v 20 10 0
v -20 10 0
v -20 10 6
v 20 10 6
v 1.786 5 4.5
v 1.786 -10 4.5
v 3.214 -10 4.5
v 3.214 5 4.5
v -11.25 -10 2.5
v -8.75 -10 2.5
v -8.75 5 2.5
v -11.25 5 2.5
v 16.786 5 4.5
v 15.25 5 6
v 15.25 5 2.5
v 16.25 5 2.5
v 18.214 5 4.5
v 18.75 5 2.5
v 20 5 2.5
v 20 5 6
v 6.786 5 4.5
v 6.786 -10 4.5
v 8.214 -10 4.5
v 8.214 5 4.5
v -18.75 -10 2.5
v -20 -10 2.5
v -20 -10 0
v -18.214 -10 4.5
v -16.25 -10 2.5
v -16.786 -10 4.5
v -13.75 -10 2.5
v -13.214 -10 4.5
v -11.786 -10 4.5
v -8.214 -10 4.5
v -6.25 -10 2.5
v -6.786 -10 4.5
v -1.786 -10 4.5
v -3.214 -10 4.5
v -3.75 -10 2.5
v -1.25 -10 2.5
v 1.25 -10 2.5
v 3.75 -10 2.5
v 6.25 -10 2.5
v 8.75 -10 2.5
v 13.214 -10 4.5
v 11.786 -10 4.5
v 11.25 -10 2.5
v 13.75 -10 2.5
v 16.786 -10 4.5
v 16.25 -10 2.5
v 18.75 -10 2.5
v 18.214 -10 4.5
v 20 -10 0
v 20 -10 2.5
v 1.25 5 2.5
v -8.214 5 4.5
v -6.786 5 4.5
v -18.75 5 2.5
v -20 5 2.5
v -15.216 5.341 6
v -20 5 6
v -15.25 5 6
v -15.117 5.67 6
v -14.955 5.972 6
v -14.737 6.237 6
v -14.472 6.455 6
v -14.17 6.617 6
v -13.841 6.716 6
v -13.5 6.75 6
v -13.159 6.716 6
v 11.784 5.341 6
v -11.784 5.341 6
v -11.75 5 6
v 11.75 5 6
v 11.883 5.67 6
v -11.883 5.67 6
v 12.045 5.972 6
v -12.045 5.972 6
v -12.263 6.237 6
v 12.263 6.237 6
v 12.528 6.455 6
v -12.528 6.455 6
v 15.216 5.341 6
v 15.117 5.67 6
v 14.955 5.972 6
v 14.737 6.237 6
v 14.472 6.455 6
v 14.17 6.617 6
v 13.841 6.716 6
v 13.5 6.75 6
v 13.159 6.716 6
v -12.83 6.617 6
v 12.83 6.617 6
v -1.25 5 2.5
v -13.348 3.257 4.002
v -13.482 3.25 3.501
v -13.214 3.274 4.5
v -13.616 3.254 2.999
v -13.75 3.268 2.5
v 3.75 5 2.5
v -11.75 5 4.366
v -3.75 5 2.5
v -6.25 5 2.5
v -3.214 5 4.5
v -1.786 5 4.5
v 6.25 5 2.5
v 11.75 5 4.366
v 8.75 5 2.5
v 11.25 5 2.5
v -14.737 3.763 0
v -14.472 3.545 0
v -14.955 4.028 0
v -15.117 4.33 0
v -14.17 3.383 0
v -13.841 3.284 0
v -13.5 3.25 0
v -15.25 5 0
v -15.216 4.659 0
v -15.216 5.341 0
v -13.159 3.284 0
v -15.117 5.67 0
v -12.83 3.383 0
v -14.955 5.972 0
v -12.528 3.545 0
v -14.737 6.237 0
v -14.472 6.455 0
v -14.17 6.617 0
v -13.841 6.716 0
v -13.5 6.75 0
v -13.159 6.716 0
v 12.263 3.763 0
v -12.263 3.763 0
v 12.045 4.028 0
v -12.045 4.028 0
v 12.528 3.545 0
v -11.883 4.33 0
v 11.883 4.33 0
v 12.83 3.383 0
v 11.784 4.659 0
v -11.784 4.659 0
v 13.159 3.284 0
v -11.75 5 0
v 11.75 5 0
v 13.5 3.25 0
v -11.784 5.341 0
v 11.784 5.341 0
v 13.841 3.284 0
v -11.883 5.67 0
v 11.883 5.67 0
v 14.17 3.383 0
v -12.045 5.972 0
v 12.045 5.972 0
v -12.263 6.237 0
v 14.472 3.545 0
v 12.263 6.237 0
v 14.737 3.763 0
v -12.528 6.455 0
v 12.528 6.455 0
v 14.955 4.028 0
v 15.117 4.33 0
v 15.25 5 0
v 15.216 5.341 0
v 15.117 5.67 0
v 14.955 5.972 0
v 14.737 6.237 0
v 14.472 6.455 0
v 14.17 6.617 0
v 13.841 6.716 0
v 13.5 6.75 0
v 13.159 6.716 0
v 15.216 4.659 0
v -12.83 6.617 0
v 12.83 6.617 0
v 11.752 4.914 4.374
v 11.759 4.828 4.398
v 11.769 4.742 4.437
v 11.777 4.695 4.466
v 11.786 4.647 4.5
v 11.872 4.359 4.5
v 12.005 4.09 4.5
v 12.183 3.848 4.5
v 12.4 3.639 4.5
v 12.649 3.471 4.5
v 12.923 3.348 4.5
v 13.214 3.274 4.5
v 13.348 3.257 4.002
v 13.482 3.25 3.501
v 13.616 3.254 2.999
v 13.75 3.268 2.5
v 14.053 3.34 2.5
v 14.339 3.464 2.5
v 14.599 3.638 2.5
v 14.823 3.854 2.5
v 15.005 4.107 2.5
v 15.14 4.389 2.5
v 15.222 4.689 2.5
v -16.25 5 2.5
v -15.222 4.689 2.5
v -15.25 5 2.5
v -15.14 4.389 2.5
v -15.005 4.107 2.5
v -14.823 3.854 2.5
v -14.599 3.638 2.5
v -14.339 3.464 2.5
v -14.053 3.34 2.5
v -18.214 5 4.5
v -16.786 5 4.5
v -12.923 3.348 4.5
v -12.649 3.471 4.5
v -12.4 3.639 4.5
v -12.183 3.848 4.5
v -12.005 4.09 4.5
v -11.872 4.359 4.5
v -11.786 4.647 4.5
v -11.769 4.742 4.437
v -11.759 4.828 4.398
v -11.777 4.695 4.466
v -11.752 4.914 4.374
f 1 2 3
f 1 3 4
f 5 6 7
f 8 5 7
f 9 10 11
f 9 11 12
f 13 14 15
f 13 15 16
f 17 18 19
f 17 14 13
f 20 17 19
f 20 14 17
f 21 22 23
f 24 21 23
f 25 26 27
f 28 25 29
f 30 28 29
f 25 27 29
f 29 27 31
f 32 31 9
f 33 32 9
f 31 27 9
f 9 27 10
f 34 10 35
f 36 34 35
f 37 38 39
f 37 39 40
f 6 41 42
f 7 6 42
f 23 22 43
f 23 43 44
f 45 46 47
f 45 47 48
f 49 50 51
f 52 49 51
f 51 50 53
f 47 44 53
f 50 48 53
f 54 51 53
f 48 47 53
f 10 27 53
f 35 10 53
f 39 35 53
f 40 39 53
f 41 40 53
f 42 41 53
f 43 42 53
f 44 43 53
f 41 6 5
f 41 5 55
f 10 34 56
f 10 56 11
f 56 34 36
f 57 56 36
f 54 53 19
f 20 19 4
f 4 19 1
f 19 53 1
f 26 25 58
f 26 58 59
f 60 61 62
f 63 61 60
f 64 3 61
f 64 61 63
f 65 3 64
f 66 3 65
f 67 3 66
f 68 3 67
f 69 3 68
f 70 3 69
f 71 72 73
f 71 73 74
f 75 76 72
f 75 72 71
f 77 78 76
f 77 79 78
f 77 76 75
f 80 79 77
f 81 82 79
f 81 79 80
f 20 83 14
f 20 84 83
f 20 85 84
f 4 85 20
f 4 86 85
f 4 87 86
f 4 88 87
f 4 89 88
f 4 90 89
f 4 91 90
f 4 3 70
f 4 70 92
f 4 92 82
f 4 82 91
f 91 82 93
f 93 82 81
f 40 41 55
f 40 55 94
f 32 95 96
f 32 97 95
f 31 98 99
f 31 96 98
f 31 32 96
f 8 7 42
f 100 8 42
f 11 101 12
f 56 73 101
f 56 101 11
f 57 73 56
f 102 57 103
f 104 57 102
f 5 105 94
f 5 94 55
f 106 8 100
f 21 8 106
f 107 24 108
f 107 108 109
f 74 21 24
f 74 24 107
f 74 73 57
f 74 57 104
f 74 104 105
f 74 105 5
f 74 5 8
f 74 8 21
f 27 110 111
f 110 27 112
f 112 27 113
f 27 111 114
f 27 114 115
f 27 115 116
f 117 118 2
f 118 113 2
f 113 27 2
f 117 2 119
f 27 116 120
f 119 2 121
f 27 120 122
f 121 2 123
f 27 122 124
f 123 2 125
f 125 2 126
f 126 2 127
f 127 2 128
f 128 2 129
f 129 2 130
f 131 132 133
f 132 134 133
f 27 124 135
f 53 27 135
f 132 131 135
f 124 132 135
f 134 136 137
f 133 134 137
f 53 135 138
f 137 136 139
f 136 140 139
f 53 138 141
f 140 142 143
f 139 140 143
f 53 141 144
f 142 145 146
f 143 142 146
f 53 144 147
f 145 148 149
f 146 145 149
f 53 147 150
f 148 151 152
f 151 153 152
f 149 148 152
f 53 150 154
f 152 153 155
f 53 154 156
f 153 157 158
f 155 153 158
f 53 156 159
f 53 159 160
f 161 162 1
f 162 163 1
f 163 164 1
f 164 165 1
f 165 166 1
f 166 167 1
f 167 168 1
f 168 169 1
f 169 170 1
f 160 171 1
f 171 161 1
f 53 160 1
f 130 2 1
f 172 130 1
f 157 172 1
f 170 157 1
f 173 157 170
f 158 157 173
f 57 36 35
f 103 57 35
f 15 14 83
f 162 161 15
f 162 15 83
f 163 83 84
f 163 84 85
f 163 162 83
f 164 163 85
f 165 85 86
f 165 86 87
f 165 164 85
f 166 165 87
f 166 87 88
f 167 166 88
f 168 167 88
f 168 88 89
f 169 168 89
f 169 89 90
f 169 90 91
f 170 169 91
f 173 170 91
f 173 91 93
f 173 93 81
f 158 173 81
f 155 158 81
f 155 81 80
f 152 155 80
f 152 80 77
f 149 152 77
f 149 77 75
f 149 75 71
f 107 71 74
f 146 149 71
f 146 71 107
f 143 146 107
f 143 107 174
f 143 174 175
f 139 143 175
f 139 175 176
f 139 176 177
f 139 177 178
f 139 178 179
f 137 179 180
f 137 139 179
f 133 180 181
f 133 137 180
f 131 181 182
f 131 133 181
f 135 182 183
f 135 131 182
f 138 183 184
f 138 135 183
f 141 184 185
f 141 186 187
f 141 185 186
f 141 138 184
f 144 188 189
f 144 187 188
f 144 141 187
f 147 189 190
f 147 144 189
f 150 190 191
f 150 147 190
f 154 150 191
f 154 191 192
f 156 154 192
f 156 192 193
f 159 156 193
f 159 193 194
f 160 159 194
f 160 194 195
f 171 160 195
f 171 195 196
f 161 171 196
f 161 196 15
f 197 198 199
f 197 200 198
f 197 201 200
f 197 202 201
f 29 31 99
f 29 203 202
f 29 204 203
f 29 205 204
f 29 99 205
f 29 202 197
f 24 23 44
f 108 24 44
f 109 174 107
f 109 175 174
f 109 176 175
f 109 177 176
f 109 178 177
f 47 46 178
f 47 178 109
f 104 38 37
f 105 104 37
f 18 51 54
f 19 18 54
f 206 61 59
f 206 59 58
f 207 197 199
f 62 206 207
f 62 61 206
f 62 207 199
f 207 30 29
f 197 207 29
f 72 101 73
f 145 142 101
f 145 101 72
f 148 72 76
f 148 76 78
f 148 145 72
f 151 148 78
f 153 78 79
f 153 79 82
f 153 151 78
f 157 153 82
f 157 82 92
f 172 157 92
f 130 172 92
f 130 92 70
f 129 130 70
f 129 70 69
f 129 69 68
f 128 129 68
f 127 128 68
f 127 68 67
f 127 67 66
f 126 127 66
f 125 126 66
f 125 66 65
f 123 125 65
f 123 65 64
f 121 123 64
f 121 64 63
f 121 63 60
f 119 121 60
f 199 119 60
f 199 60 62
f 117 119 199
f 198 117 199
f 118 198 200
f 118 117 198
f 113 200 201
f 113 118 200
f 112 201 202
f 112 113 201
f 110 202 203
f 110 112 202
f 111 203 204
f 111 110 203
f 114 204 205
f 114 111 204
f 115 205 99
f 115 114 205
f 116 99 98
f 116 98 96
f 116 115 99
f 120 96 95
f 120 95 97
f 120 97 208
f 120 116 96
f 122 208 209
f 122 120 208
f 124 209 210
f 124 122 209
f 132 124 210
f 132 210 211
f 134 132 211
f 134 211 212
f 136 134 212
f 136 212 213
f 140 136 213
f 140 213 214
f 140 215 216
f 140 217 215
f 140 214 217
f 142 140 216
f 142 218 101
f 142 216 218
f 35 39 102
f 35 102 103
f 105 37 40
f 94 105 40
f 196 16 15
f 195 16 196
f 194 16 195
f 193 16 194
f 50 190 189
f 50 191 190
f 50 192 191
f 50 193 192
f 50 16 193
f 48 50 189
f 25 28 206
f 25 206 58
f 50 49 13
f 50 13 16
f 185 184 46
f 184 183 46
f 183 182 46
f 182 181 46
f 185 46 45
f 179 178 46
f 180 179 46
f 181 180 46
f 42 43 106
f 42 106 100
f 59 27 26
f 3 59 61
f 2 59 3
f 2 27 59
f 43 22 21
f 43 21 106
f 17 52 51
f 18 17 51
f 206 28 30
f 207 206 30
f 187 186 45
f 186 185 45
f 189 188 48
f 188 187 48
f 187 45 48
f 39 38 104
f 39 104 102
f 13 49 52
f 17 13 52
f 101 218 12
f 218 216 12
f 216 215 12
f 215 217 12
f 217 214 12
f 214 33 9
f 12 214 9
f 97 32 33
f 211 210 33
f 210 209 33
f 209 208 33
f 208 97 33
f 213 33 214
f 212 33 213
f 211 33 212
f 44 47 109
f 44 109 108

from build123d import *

# Parameters (mm, degrees)
SKETCH_1_W             = 40
SKETCH_1_H             = 20
SKETCH_1_R             = 1.75
EXTRUDE_1_DEPTH        = 6
SKETCH_2_W             = 40
SKETCH_2_H             = 1.5
CUT_EXTRUDE_1_DEPTH    = 15
CUT_EXTRUDE_2_DEPTH    = 15
PATTERN_LINEAR_1_COUNT = 8
PATTERN_LINEAR_1_PITCH = 5


with BuildPart() as part:
    # 草圖1 → 填料-伸長1 (new body)
    with BuildSketch(Plane.XY):
        Rectangle(SKETCH_1_W, SKETCH_1_H)
        with Locations((-13.5, 5)):
            Circle(SKETCH_1_R, mode=Mode.SUBTRACT)
        with Locations((13.5, 5)):
            Circle(SKETCH_1_R, mode=Mode.SUBTRACT)
    extrude(amount=EXTRUDE_1_DEPTH)

    # 草圖2 → 除料-伸長1 (cut)
    with BuildSketch(Plane.XZ.offset(10)):
        with Locations((0, 5.25)):
            Rectangle(SKETCH_2_W, SKETCH_2_H)
    extrude(amount=-CUT_EXTRUDE_1_DEPTH, mode=Mode.SUBTRACT)

    # 草圖3 → 除料-伸長2 (cut)
    with BuildSketch(Plane(origin=(0, -10, 0), x_dir=(-1, 0, 0), z_dir=(0, -1, 0))):
        Polygon((20, -4.5), (18.214101615, -4.5), (18.75, -2.5), (20, -2.5), align=None)
        Polygon((16.785898385, -4.5), (16.25, -2.5), (15, -2.5), (15, -4.5), align=None)
    cut_extrude_2 = extrude(amount=-CUT_EXTRUDE_2_DEPTH, mode=Mode.SUBTRACT)

    # 直線複製排列1: 除料-伸長2 ×8
    with Locations(*[(i * PATTERN_LINEAR_1_PITCH, 0, 0) for i in range(1, PATTERN_LINEAR_1_COUNT)]):
        add(cut_extrude_2, mode=Mode.SUBTRACT)


solid = part.part
